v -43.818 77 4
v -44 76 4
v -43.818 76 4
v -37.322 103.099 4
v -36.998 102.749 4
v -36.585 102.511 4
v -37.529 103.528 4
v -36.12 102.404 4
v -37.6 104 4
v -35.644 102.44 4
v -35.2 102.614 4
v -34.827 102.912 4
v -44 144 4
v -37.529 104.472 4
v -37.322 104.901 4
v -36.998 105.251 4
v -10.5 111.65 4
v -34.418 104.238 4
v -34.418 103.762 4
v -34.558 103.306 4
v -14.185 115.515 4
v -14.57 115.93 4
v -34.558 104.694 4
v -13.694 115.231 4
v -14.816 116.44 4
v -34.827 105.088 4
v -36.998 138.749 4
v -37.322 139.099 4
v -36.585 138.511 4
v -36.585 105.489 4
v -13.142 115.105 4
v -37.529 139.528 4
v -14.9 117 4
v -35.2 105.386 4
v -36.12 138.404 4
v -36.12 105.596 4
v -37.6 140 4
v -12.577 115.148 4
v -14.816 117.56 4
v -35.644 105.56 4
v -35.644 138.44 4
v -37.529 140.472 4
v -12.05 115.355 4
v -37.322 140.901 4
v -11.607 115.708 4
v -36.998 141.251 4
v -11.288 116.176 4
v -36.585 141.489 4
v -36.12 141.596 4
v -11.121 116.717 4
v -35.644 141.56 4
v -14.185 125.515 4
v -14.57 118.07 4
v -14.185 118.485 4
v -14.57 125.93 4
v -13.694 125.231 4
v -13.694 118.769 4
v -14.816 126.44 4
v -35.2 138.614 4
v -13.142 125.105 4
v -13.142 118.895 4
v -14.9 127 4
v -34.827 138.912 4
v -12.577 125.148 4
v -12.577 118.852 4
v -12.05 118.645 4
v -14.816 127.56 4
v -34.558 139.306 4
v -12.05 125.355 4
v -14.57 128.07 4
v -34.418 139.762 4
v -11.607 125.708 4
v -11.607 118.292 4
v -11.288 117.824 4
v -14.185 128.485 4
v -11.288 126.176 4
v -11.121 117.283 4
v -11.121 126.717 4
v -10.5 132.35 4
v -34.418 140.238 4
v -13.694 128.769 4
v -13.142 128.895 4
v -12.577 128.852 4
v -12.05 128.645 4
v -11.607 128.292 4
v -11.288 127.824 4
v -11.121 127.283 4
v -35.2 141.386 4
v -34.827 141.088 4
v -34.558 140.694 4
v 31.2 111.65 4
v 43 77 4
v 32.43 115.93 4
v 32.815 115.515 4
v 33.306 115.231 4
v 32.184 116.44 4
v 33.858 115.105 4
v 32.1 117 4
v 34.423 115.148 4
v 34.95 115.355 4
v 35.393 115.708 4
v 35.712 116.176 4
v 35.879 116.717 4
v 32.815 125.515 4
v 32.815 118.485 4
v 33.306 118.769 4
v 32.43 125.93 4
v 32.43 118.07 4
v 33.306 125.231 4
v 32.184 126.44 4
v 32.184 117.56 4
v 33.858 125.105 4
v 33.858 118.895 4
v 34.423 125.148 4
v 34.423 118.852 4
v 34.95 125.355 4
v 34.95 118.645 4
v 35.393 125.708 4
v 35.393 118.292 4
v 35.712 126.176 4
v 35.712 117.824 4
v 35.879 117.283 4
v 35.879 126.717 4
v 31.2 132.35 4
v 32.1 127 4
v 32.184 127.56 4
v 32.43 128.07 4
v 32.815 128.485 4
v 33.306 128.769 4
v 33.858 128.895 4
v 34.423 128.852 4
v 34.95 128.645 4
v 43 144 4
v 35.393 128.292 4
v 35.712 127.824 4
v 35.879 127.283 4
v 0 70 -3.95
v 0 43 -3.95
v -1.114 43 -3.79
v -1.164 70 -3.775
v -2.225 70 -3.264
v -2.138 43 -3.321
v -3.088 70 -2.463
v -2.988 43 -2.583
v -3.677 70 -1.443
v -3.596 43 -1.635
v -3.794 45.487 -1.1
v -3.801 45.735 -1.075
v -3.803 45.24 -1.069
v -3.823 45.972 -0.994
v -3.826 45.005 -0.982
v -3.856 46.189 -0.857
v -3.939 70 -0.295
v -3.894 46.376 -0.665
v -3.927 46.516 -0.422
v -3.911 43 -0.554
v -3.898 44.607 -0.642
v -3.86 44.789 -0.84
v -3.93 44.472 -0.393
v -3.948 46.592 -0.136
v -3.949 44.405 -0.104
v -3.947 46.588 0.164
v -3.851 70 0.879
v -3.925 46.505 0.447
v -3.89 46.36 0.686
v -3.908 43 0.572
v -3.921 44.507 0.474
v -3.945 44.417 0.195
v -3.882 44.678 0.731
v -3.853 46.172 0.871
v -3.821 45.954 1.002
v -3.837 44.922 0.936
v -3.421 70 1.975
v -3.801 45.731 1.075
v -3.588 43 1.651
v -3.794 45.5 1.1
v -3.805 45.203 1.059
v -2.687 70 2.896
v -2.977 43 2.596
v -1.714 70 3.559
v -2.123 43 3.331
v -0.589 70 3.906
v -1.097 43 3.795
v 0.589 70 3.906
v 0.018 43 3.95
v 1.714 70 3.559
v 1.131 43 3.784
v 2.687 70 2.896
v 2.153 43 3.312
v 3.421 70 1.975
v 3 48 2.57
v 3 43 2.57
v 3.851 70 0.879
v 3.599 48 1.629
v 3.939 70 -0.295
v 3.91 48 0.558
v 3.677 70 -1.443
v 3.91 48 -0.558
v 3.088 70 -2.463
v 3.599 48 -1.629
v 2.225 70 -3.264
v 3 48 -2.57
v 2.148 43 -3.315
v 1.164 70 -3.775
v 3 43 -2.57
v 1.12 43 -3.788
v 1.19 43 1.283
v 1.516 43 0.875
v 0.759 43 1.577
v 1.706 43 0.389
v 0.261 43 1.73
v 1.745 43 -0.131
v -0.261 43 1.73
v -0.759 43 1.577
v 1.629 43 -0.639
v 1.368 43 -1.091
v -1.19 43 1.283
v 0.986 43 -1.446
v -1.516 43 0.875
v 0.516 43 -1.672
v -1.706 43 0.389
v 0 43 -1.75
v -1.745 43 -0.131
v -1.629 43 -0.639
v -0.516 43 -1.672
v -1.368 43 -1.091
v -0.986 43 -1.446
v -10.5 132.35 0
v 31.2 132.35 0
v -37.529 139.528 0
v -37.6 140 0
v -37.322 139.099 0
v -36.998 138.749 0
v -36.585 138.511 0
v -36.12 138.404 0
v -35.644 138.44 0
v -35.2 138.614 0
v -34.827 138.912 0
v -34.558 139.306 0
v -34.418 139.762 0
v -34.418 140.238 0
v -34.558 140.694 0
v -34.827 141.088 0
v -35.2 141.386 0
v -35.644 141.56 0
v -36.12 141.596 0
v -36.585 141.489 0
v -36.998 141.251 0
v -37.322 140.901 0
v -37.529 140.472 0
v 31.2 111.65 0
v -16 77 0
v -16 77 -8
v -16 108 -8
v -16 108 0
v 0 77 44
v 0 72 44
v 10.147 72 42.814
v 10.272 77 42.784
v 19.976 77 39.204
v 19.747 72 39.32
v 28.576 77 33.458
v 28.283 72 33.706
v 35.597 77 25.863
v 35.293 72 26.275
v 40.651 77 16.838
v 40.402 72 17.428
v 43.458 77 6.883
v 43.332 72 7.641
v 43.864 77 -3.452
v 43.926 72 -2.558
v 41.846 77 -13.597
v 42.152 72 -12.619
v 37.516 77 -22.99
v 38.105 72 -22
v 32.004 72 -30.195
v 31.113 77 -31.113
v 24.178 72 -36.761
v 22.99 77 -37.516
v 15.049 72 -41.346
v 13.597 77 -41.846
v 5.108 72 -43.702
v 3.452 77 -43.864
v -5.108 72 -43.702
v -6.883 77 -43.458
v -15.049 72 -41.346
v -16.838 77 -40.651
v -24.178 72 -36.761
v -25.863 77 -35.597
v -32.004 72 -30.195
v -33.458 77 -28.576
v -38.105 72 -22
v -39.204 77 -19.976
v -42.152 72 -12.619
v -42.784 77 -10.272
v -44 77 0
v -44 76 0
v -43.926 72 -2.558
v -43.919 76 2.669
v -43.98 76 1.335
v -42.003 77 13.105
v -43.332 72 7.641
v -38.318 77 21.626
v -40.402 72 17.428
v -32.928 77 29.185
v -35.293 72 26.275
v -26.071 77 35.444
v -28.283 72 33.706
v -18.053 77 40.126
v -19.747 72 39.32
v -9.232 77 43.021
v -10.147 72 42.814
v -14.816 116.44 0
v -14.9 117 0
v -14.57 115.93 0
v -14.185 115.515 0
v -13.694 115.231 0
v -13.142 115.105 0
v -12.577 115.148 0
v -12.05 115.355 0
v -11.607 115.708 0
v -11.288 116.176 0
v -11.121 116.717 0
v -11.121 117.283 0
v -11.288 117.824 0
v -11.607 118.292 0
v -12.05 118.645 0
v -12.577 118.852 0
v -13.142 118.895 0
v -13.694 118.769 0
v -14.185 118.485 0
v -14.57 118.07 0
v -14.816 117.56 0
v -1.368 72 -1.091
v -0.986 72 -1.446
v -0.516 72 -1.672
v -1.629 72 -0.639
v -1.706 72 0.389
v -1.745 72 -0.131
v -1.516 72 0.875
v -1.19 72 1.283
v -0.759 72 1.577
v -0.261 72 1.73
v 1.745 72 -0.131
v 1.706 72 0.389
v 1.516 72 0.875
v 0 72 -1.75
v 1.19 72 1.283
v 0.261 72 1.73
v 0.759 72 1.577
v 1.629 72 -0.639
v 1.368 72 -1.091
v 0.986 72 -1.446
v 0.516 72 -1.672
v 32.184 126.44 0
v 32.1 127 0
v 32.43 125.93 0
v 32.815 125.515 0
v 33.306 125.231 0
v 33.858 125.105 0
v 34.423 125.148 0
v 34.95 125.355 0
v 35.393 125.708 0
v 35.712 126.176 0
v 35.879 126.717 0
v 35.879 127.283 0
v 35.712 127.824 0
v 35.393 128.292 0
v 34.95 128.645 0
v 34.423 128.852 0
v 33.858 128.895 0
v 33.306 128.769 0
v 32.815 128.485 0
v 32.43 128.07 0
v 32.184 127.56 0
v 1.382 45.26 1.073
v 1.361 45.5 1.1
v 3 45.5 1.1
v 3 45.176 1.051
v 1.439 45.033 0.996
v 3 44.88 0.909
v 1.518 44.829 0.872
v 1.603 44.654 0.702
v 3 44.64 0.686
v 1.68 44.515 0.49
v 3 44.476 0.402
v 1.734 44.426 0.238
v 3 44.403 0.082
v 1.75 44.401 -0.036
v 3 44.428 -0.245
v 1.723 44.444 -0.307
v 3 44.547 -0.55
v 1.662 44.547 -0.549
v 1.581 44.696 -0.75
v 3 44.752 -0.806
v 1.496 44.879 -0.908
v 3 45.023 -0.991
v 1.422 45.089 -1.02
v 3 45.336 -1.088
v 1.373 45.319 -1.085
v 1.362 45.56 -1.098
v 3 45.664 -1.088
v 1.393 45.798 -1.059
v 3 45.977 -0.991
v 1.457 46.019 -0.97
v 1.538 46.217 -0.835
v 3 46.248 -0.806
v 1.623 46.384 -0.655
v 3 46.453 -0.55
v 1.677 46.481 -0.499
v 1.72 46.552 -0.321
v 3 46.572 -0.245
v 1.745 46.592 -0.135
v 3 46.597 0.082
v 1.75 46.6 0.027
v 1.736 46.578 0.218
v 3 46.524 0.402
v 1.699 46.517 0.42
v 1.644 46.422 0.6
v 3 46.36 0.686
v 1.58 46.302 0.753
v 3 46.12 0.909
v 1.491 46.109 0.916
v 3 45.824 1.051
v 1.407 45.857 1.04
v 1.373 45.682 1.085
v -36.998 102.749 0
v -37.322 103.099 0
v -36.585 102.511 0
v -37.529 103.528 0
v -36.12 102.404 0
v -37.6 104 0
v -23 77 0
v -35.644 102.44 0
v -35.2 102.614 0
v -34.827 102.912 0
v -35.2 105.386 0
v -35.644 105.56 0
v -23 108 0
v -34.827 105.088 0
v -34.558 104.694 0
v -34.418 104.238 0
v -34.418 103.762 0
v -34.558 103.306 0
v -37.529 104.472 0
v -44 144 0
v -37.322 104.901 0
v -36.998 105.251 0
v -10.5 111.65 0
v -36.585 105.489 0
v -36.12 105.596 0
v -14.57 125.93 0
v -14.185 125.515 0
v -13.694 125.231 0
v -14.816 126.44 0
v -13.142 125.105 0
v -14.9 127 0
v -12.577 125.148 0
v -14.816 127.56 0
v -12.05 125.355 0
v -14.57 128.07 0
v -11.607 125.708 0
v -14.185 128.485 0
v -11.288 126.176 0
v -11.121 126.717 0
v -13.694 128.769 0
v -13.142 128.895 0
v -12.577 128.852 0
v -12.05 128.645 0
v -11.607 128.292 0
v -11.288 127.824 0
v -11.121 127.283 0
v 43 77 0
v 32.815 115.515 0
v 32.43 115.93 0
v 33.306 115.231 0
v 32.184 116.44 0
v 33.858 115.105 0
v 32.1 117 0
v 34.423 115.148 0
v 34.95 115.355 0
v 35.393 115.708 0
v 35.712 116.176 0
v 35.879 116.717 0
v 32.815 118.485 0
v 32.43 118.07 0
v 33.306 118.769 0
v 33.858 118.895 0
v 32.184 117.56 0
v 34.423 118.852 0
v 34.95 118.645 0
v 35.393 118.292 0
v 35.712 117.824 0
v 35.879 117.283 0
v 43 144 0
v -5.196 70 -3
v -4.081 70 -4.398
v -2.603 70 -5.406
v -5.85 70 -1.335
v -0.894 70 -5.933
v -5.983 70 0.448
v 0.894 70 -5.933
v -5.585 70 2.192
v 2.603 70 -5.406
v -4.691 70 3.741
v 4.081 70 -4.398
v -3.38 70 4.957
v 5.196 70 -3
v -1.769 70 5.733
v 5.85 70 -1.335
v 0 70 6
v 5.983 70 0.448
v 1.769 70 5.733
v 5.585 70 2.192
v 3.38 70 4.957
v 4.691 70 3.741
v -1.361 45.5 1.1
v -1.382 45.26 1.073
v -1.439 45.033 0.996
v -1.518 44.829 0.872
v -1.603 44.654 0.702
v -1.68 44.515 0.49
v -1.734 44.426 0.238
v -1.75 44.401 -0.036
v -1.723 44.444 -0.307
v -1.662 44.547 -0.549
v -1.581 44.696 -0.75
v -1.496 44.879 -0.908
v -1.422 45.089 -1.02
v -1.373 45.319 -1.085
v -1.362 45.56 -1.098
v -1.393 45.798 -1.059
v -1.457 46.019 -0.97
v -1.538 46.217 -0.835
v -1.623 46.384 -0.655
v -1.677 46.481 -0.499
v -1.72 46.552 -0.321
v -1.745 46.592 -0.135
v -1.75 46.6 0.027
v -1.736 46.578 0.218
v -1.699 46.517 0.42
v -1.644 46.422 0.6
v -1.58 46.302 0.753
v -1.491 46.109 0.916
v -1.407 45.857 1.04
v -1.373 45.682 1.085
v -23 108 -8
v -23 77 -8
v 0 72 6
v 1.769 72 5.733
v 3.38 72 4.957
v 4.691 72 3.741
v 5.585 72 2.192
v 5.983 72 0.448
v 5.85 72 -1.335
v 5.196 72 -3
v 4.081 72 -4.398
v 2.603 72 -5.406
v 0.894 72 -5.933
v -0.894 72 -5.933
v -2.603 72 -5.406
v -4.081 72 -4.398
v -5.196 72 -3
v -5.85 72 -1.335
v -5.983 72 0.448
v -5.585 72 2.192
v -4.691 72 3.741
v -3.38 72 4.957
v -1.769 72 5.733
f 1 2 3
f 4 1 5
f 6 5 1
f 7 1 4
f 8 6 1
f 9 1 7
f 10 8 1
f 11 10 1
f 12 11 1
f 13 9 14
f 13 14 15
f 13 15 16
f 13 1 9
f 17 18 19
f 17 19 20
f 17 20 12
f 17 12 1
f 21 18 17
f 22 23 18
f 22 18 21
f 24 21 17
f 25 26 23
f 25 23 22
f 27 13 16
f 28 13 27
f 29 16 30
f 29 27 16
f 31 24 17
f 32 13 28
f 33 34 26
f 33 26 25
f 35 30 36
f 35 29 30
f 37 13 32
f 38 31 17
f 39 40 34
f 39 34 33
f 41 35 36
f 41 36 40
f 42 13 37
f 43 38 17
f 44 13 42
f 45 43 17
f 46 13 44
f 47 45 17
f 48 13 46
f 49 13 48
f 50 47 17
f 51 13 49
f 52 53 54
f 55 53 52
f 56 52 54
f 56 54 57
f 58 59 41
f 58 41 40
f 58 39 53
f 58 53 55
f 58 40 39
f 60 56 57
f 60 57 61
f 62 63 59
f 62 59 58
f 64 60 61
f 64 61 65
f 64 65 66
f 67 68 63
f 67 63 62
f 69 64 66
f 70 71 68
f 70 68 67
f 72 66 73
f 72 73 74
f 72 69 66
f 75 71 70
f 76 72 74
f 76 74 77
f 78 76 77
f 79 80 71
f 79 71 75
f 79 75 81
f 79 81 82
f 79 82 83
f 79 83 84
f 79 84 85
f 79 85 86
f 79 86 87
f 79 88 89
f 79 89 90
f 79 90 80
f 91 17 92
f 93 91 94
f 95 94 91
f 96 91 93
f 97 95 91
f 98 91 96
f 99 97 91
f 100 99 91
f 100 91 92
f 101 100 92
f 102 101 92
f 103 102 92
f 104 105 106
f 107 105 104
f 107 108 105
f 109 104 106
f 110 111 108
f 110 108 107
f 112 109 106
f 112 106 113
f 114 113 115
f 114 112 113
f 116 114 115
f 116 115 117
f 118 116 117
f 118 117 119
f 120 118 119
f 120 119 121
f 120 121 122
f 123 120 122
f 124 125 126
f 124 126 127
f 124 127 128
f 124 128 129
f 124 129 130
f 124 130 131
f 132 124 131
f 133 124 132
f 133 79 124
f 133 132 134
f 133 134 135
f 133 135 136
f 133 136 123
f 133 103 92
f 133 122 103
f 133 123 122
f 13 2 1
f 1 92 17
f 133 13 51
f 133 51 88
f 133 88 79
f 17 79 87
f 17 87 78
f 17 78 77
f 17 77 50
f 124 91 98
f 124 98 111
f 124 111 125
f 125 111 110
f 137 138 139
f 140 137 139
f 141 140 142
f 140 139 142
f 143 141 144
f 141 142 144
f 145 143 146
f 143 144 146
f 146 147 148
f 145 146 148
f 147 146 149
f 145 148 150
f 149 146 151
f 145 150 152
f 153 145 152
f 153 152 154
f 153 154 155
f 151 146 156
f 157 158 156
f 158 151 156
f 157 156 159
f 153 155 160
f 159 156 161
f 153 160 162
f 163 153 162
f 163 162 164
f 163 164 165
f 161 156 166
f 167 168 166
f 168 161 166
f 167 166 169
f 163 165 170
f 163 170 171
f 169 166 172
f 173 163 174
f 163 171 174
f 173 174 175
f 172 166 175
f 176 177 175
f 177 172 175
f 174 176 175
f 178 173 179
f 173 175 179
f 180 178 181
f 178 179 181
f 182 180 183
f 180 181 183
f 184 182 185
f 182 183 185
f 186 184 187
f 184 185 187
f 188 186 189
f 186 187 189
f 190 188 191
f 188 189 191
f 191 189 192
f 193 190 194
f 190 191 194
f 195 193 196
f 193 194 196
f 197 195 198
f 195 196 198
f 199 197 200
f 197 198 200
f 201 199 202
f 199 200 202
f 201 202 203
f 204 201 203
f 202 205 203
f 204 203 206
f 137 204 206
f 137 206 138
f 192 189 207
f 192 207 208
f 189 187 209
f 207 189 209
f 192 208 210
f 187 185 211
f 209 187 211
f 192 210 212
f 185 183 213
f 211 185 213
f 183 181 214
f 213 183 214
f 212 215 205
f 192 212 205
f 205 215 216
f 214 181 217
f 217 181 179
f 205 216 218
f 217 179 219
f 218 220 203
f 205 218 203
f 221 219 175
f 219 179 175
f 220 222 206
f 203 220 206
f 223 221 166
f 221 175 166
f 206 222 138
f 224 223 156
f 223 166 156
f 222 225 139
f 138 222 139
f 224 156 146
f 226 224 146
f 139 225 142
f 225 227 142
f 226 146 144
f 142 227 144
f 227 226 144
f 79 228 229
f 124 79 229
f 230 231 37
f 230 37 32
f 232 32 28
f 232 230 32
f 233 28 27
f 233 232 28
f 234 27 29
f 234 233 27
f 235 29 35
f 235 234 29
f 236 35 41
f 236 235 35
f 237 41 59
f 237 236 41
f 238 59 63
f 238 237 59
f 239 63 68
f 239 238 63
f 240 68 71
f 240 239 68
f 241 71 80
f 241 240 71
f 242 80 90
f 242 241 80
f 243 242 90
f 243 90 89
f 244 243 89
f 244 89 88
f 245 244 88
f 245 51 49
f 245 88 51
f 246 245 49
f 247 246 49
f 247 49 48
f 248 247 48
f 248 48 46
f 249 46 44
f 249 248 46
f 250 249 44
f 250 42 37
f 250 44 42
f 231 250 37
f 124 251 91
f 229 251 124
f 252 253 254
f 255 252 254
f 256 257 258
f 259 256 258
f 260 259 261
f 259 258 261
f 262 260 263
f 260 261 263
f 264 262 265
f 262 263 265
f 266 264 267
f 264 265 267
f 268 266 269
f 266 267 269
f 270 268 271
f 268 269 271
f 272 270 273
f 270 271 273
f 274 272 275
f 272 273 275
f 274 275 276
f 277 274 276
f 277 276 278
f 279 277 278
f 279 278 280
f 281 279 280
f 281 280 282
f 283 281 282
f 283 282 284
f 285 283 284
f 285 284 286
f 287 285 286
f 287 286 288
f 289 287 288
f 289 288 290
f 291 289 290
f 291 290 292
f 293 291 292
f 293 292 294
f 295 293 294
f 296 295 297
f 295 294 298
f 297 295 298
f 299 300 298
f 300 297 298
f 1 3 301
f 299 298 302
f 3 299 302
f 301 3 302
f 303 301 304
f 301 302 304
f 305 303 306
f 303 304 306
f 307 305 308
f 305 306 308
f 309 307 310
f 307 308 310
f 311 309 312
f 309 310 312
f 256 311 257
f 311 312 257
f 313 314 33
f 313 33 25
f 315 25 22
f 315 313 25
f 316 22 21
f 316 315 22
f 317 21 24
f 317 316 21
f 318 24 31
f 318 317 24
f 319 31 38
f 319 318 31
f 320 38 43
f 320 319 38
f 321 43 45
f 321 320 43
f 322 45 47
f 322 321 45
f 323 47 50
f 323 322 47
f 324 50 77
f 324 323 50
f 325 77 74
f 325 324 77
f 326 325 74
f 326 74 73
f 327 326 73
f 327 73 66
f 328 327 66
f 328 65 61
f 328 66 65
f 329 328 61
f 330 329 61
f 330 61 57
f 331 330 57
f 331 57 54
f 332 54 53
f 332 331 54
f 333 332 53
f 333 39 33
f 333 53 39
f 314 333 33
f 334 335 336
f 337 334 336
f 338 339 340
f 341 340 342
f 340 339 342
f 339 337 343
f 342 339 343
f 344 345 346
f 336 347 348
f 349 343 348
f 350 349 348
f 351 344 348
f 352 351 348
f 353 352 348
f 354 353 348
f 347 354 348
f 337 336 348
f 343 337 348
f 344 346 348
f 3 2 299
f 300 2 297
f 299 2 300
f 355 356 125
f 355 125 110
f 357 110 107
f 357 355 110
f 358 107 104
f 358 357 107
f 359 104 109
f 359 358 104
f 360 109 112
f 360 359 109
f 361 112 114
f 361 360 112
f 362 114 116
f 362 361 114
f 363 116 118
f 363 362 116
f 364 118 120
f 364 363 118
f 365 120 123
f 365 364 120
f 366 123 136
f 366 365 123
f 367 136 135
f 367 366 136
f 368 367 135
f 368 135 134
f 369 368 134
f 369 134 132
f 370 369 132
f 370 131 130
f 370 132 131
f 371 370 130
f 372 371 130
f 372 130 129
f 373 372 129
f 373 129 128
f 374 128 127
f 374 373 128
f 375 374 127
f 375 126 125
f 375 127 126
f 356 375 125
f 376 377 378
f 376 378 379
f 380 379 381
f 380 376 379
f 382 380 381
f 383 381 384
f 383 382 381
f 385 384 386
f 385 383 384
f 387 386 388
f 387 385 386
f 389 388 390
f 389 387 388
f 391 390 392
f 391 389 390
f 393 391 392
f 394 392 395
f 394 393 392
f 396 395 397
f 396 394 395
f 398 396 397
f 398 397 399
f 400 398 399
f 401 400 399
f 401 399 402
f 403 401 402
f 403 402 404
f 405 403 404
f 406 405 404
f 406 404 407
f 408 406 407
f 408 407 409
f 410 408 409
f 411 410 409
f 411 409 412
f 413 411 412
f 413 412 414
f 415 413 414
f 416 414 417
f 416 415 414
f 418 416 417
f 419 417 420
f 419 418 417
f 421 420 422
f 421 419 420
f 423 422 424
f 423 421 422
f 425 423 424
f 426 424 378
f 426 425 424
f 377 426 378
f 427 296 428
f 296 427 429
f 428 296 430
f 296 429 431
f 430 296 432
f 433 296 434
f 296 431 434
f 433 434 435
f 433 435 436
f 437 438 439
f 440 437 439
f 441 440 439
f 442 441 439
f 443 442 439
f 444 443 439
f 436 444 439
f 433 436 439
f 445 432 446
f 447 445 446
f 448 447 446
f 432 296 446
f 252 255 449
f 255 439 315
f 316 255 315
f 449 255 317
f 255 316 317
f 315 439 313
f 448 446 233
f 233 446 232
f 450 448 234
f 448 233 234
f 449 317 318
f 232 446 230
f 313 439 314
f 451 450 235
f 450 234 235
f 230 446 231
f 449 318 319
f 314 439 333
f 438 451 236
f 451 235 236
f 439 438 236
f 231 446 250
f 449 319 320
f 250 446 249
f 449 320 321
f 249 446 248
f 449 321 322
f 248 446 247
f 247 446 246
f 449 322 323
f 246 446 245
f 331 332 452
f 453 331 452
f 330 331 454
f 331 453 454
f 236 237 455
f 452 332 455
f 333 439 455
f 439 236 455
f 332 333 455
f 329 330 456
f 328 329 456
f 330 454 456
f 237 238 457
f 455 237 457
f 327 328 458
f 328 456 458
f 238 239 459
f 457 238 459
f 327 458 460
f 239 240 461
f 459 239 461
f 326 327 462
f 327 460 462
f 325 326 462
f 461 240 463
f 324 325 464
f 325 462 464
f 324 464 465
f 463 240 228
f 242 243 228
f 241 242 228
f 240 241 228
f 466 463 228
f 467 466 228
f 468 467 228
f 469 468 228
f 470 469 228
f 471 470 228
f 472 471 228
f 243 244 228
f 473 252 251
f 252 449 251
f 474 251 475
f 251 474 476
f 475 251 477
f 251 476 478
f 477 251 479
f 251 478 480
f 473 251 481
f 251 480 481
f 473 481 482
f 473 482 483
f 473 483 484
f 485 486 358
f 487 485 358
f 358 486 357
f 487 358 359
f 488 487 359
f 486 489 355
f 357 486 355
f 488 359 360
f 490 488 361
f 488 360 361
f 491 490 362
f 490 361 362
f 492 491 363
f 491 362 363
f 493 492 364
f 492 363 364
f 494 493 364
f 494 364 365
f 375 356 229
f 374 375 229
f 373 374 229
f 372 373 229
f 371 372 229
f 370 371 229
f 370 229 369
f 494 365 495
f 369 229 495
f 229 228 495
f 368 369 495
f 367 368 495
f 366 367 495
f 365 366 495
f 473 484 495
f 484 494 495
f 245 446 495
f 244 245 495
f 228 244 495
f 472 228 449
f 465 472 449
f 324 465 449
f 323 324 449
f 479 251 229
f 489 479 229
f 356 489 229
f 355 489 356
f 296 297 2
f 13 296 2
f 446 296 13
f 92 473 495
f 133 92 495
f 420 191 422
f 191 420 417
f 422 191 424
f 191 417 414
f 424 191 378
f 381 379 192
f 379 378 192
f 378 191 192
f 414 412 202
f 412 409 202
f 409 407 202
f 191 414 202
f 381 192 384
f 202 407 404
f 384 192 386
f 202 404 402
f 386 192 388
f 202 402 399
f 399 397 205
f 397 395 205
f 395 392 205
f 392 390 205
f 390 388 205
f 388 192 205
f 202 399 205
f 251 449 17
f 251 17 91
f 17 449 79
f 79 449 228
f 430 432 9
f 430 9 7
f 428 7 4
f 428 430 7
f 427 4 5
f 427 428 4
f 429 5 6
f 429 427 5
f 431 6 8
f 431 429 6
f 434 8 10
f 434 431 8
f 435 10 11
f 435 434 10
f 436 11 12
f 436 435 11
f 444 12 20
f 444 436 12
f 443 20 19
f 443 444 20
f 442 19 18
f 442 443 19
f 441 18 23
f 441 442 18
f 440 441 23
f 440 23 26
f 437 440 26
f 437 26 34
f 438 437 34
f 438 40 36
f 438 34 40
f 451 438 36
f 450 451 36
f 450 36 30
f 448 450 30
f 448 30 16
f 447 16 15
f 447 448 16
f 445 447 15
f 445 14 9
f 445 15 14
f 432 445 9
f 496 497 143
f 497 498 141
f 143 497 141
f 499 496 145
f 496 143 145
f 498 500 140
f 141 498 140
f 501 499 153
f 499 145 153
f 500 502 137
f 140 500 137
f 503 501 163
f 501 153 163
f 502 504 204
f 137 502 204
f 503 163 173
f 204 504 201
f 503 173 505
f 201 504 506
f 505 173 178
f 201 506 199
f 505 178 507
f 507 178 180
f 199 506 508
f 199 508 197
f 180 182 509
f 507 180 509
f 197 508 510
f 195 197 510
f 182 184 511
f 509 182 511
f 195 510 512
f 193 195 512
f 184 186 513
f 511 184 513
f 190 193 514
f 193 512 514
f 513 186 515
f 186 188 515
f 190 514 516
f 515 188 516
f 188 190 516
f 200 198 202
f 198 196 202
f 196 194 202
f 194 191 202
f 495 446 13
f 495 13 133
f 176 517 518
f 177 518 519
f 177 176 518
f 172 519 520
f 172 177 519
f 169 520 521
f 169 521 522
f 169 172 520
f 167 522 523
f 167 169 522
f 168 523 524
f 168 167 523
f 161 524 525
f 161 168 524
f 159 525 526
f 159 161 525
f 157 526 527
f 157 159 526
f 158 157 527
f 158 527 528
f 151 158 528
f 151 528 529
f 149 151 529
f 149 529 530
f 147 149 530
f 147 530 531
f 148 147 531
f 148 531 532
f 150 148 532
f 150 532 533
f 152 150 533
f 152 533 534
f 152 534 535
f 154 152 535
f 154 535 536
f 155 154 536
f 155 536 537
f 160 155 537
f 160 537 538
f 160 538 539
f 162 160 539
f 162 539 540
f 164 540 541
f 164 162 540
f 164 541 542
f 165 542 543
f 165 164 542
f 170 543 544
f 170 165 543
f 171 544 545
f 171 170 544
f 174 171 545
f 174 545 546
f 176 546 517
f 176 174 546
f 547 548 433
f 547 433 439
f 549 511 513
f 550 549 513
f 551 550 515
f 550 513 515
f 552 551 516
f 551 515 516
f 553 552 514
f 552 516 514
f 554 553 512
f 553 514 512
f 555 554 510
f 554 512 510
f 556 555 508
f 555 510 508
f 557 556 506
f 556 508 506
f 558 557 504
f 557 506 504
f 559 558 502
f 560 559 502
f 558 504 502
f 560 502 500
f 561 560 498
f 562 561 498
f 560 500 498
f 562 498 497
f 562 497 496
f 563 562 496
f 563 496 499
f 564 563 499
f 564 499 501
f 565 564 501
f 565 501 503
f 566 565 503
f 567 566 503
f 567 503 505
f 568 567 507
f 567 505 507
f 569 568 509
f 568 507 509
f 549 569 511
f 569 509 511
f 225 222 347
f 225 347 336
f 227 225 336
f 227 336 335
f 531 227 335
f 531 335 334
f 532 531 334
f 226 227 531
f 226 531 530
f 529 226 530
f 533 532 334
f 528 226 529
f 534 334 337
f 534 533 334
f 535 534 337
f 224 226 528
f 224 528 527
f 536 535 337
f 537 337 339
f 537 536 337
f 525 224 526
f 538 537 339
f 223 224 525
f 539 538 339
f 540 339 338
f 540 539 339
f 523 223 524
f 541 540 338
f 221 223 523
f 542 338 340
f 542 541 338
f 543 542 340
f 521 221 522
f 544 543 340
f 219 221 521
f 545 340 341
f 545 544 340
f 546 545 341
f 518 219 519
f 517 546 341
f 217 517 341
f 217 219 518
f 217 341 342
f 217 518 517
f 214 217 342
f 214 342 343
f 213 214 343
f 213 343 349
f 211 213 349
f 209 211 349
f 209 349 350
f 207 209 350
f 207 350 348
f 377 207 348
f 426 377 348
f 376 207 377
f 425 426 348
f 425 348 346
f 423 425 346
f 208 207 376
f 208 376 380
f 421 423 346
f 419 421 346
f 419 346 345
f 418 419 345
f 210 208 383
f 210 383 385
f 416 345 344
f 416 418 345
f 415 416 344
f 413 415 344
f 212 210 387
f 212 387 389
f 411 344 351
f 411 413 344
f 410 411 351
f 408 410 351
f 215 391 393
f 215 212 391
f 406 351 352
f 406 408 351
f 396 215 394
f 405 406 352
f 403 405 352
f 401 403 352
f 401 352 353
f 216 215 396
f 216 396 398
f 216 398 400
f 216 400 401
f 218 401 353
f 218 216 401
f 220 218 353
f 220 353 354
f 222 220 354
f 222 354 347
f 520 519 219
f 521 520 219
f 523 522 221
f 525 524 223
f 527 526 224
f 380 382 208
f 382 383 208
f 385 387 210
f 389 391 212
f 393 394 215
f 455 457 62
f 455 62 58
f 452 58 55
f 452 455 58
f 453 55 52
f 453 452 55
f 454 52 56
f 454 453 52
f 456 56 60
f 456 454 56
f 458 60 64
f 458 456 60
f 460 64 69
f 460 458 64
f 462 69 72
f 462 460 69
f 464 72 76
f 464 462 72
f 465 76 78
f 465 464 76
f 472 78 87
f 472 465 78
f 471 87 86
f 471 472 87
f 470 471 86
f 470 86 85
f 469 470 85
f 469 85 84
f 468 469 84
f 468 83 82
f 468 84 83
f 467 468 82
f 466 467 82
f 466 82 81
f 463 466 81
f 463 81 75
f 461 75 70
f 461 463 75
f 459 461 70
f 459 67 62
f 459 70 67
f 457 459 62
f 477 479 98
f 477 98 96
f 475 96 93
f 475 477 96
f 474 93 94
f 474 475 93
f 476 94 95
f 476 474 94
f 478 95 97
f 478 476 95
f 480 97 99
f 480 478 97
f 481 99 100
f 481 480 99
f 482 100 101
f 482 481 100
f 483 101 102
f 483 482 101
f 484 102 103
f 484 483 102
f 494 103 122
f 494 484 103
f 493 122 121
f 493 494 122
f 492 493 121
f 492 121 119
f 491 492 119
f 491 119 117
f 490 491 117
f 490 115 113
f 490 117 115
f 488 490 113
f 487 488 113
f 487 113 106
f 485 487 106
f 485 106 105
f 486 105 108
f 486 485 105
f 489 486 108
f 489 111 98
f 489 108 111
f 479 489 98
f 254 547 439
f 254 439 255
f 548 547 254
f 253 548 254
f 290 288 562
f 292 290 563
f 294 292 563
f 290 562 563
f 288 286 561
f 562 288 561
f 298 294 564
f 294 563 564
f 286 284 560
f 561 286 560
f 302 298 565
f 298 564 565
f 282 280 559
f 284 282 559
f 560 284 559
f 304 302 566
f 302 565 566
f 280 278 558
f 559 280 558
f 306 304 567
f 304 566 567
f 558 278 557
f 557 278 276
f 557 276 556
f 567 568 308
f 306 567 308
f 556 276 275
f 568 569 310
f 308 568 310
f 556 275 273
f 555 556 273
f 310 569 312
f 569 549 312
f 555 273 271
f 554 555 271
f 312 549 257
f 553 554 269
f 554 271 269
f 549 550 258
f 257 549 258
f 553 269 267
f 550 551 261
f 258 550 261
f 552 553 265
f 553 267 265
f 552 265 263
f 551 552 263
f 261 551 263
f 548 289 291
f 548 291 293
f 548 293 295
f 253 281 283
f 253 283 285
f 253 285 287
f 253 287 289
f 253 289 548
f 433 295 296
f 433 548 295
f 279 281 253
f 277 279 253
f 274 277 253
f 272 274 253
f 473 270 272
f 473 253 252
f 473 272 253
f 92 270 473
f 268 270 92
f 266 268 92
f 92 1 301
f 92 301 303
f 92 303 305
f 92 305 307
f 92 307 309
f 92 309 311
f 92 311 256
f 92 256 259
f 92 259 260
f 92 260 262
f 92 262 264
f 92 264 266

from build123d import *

# Parameters (mm, degrees)
YAW_PLATFORM_START                         = 72
YAW_PLATFORM_PROFILE_R                     = 44
YAW_PLATFORM_DEPTH                         = 5
PRINTED_HOLLOW_YAW_SPINDLE_START           = 43
PRINTED_HOLLOW_YAW_SPINDLE_PROFILE_R       = 3.95
PRINTED_HOLLOW_YAW_SPINDLE_PROFILE_R_2     = 1.75
PRINTED_HOLLOW_YAW_SPINDLE_DEPTH           = 29
INNER_RACE_LOAD_SHOULDER_START             = 70
INNER_RACE_LOAD_SHOULDER_PROFILE_R         = 6
INNER_RACE_LOAD_SHOULDER_PROFILE_R_2       = 1.75
INNER_RACE_LOAD_SHOULDER_DEPTH             = 2
D_FLAT_ON_SPINDLE_END_START                = 43
D_FLAT_DRIVE_KEY_PROFILE_W                 = 3
D_FLAT_DRIVE_KEY_PROFILE_H                 = 10
D_FLAT_ON_SPINDLE_END_DEPTH                = 5
SHOULDER_MOUNT_PLATE_PROFILE_W             = 87
SHOULDER_MOUNT_PLATE_PROFILE_H             = 68
SHOULDER_MOUNT_PLATE_DEPTH                 = 4
MG996_BODY_WINDOW_START                    = -5
MG996_BODY_WINDOW_PROFILE_W                = 41.7
MG996_BODY_WINDOW_PROFILE_H                = 20.7
MG996_BODY_WINDOW_DEPTH                    = 162.869372409
MG996_TAB_MOUNTS_START                     = -50
MG996_TAB_MOUNTS_PROFILE_R                 = 1.9
MG996_TAB_MOUNTS_DEPTH                     = 207.869372409
PASSIVE_SHOULDER_STANDOFFS_START           = -50
PASSIVE_SHOULDER_STANDOFFS_PROFILE_R       = 1.6
PASSIVE_SHOULDER_STANDOFFS_DEPTH           = 207.869372409
UPRIGHT_RIB_START                          = -8
UPRIGHT_RIB_PROFILE_W                      = 7
UPRIGHT_RIB_PROFILE_H                      = 31
UPRIGHT_RIB_DEPTH                          = 12
YAW_POSITIVE_RETENTION_CROSSBOLT_START     = -10
YAW_POSITIVE_RETENTION_CROSSBOLT_PROFILE_R = 1.1
YAW_POSITIVE_RETENTION_CROSSBOLT_DEPTH     = 167.869372409


with BuildPart() as part:
    # Yaw_platform_profile → Yaw_platform (new body)
    with BuildSketch(Plane(origin=(0, 0, 0), x_dir=(1, 0, 0), z_dir=(0, 1, 0)).offset(YAW_PLATFORM_START)):
        with Locations(Location((0, 0, 0), (0, 0, 270))):
            Circle(YAW_PLATFORM_PROFILE_R)
    extrude(amount=YAW_PLATFORM_DEPTH)

    # Printed_hollow_yaw_spindle_profile → Printed_hollow_yaw_spindle (add)
    with BuildSketch(Plane(origin=(0, 0, 0), x_dir=(1, 0, 0), z_dir=(0, 1, 0)).offset(PRINTED_HOLLOW_YAW_SPINDLE_START)):
        with Locations(Location((0, 0, 0), (0, 0, 90))):
            Circle(PRINTED_HOLLOW_YAW_SPINDLE_PROFILE_R)
        with Locations(Location((0, 0, 0), (0, 0, 90))):
            Circle(PRINTED_HOLLOW_YAW_SPINDLE_PROFILE_R_2, mode=Mode.SUBTRACT)
    extrude(amount=PRINTED_HOLLOW_YAW_SPINDLE_DEPTH)

    # Inner_race_load_shoulder_profile → Inner_race_load_shoulder (add)
    with BuildSketch(Plane(origin=(0, 0, 0), x_dir=(1, 0, 0), z_dir=(0, 1, 0)).offset(INNER_RACE_LOAD_SHOULDER_START)):
        with Locations(Location((0, 0, 0), (0, 0, 270))):
            Circle(INNER_RACE_LOAD_SHOULDER_PROFILE_R)
        with Locations(Location((0, 0, 0), (0, 0, 90))):
            Circle(INNER_RACE_LOAD_SHOULDER_PROFILE_R_2, mode=Mode.SUBTRACT)
    extrude(amount=INNER_RACE_LOAD_SHOULDER_DEPTH)

    # D_flat_drive_key_profile → D_flat_on_spindle_end (cut)
    with BuildSketch(Plane(origin=(0, 0, 0), x_dir=(1, 0, 0), z_dir=(0, 1, 0)).offset(D_FLAT_ON_SPINDLE_END_START)):
        with Locations((4.5, 0)):
            Rectangle(D_FLAT_DRIVE_KEY_PROFILE_W, D_FLAT_DRIVE_KEY_PROFILE_H)
    extrude(amount=D_FLAT_ON_SPINDLE_END_DEPTH, mode=Mode.SUBTRACT)

    # Shoulder_mount_plate_profile → Shoulder_mount_plate (add)
    with BuildSketch(Plane.XY):
        with Locations((-0.5, 110)):
            Rectangle(SHOULDER_MOUNT_PLATE_PROFILE_W, SHOULDER_MOUNT_PLATE_PROFILE_H)
    extrude(amount=SHOULDER_MOUNT_PLATE_DEPTH)

    # MG996_body_window_profile → MG996_body_window (cut, through all)
    with BuildSketch(Plane.XY.offset(MG996_BODY_WINDOW_START)):
        with Locations((10.35, 122)):
            Rectangle(MG996_BODY_WINDOW_PROFILE_W, MG996_BODY_WINDOW_PROFILE_H)
    extrude(amount=MG996_BODY_WINDOW_DEPTH, mode=Mode.SUBTRACT)

    # MG996_tab_mounts_profile → MG996_tab_mounts (cut, through all)
    with BuildSketch(Plane.XY.offset(MG996_TAB_MOUNTS_START)):
        with Locations(Location((-13, 117, 0), (0, 0, 180))):
            Circle(MG996_TAB_MOUNTS_PROFILE_R)
        with Locations(Location((-13, 127, 0), (0, 0, 180))):
            Circle(MG996_TAB_MOUNTS_PROFILE_R)
        with Locations(Location((34, 117, 0), (0, 0, 180))):
            Circle(MG996_TAB_MOUNTS_PROFILE_R)
        with Locations(Location((34, 127, 0), (0, 0, 180))):
            Circle(MG996_TAB_MOUNTS_PROFILE_R)
    extrude(amount=MG996_TAB_MOUNTS_DEPTH, mode=Mode.SUBTRACT)

    # Passive_shoulder_standoffs_profile → Passive_shoulder_standoffs (cut, through all)
    with BuildSketch(Plane.XY.offset(PASSIVE_SHOULDER_STANDOFFS_START)):
        with Locations(Location((-36, 104, 0), (0, 0, 180))):
            Circle(PASSIVE_SHOULDER_STANDOFFS_PROFILE_R)
        with Locations(Location((-36, 140, 0), (0, 0, 180))):
            Circle(PASSIVE_SHOULDER_STANDOFFS_PROFILE_R)
    extrude(amount=PASSIVE_SHOULDER_STANDOFFS_DEPTH, mode=Mode.SUBTRACT)

    # Upright_rib_profile → Upright_rib (add)
    with BuildSketch(Plane.XY.offset(UPRIGHT_RIB_START)):
        with Locations((-19.5, 92.5)):
            Rectangle(UPRIGHT_RIB_PROFILE_W, UPRIGHT_RIB_PROFILE_H)
    extrude(amount=UPRIGHT_RIB_DEPTH)

    # Yaw_positive_retention_crossbolt_profile → Yaw_positive_retention_crossbolt (cut, through all)
    with BuildSketch(Plane(origin=(0, 0, 0), x_dir=(0, 0, -1), z_dir=(1, 0, 0)).offset(YAW_POSITIVE_RETENTION_CROSSBOLT_START)):
        with Locations(Location((0, 45.5, 0), (0, 0, 180))):
            Circle(YAW_POSITIVE_RETENTION_CROSSBOLT_PROFILE_R)
    extrude(amount=YAW_POSITIVE_RETENTION_CROSSBOLT_DEPTH, mode=Mode.SUBTRACT)


solid = part.part
